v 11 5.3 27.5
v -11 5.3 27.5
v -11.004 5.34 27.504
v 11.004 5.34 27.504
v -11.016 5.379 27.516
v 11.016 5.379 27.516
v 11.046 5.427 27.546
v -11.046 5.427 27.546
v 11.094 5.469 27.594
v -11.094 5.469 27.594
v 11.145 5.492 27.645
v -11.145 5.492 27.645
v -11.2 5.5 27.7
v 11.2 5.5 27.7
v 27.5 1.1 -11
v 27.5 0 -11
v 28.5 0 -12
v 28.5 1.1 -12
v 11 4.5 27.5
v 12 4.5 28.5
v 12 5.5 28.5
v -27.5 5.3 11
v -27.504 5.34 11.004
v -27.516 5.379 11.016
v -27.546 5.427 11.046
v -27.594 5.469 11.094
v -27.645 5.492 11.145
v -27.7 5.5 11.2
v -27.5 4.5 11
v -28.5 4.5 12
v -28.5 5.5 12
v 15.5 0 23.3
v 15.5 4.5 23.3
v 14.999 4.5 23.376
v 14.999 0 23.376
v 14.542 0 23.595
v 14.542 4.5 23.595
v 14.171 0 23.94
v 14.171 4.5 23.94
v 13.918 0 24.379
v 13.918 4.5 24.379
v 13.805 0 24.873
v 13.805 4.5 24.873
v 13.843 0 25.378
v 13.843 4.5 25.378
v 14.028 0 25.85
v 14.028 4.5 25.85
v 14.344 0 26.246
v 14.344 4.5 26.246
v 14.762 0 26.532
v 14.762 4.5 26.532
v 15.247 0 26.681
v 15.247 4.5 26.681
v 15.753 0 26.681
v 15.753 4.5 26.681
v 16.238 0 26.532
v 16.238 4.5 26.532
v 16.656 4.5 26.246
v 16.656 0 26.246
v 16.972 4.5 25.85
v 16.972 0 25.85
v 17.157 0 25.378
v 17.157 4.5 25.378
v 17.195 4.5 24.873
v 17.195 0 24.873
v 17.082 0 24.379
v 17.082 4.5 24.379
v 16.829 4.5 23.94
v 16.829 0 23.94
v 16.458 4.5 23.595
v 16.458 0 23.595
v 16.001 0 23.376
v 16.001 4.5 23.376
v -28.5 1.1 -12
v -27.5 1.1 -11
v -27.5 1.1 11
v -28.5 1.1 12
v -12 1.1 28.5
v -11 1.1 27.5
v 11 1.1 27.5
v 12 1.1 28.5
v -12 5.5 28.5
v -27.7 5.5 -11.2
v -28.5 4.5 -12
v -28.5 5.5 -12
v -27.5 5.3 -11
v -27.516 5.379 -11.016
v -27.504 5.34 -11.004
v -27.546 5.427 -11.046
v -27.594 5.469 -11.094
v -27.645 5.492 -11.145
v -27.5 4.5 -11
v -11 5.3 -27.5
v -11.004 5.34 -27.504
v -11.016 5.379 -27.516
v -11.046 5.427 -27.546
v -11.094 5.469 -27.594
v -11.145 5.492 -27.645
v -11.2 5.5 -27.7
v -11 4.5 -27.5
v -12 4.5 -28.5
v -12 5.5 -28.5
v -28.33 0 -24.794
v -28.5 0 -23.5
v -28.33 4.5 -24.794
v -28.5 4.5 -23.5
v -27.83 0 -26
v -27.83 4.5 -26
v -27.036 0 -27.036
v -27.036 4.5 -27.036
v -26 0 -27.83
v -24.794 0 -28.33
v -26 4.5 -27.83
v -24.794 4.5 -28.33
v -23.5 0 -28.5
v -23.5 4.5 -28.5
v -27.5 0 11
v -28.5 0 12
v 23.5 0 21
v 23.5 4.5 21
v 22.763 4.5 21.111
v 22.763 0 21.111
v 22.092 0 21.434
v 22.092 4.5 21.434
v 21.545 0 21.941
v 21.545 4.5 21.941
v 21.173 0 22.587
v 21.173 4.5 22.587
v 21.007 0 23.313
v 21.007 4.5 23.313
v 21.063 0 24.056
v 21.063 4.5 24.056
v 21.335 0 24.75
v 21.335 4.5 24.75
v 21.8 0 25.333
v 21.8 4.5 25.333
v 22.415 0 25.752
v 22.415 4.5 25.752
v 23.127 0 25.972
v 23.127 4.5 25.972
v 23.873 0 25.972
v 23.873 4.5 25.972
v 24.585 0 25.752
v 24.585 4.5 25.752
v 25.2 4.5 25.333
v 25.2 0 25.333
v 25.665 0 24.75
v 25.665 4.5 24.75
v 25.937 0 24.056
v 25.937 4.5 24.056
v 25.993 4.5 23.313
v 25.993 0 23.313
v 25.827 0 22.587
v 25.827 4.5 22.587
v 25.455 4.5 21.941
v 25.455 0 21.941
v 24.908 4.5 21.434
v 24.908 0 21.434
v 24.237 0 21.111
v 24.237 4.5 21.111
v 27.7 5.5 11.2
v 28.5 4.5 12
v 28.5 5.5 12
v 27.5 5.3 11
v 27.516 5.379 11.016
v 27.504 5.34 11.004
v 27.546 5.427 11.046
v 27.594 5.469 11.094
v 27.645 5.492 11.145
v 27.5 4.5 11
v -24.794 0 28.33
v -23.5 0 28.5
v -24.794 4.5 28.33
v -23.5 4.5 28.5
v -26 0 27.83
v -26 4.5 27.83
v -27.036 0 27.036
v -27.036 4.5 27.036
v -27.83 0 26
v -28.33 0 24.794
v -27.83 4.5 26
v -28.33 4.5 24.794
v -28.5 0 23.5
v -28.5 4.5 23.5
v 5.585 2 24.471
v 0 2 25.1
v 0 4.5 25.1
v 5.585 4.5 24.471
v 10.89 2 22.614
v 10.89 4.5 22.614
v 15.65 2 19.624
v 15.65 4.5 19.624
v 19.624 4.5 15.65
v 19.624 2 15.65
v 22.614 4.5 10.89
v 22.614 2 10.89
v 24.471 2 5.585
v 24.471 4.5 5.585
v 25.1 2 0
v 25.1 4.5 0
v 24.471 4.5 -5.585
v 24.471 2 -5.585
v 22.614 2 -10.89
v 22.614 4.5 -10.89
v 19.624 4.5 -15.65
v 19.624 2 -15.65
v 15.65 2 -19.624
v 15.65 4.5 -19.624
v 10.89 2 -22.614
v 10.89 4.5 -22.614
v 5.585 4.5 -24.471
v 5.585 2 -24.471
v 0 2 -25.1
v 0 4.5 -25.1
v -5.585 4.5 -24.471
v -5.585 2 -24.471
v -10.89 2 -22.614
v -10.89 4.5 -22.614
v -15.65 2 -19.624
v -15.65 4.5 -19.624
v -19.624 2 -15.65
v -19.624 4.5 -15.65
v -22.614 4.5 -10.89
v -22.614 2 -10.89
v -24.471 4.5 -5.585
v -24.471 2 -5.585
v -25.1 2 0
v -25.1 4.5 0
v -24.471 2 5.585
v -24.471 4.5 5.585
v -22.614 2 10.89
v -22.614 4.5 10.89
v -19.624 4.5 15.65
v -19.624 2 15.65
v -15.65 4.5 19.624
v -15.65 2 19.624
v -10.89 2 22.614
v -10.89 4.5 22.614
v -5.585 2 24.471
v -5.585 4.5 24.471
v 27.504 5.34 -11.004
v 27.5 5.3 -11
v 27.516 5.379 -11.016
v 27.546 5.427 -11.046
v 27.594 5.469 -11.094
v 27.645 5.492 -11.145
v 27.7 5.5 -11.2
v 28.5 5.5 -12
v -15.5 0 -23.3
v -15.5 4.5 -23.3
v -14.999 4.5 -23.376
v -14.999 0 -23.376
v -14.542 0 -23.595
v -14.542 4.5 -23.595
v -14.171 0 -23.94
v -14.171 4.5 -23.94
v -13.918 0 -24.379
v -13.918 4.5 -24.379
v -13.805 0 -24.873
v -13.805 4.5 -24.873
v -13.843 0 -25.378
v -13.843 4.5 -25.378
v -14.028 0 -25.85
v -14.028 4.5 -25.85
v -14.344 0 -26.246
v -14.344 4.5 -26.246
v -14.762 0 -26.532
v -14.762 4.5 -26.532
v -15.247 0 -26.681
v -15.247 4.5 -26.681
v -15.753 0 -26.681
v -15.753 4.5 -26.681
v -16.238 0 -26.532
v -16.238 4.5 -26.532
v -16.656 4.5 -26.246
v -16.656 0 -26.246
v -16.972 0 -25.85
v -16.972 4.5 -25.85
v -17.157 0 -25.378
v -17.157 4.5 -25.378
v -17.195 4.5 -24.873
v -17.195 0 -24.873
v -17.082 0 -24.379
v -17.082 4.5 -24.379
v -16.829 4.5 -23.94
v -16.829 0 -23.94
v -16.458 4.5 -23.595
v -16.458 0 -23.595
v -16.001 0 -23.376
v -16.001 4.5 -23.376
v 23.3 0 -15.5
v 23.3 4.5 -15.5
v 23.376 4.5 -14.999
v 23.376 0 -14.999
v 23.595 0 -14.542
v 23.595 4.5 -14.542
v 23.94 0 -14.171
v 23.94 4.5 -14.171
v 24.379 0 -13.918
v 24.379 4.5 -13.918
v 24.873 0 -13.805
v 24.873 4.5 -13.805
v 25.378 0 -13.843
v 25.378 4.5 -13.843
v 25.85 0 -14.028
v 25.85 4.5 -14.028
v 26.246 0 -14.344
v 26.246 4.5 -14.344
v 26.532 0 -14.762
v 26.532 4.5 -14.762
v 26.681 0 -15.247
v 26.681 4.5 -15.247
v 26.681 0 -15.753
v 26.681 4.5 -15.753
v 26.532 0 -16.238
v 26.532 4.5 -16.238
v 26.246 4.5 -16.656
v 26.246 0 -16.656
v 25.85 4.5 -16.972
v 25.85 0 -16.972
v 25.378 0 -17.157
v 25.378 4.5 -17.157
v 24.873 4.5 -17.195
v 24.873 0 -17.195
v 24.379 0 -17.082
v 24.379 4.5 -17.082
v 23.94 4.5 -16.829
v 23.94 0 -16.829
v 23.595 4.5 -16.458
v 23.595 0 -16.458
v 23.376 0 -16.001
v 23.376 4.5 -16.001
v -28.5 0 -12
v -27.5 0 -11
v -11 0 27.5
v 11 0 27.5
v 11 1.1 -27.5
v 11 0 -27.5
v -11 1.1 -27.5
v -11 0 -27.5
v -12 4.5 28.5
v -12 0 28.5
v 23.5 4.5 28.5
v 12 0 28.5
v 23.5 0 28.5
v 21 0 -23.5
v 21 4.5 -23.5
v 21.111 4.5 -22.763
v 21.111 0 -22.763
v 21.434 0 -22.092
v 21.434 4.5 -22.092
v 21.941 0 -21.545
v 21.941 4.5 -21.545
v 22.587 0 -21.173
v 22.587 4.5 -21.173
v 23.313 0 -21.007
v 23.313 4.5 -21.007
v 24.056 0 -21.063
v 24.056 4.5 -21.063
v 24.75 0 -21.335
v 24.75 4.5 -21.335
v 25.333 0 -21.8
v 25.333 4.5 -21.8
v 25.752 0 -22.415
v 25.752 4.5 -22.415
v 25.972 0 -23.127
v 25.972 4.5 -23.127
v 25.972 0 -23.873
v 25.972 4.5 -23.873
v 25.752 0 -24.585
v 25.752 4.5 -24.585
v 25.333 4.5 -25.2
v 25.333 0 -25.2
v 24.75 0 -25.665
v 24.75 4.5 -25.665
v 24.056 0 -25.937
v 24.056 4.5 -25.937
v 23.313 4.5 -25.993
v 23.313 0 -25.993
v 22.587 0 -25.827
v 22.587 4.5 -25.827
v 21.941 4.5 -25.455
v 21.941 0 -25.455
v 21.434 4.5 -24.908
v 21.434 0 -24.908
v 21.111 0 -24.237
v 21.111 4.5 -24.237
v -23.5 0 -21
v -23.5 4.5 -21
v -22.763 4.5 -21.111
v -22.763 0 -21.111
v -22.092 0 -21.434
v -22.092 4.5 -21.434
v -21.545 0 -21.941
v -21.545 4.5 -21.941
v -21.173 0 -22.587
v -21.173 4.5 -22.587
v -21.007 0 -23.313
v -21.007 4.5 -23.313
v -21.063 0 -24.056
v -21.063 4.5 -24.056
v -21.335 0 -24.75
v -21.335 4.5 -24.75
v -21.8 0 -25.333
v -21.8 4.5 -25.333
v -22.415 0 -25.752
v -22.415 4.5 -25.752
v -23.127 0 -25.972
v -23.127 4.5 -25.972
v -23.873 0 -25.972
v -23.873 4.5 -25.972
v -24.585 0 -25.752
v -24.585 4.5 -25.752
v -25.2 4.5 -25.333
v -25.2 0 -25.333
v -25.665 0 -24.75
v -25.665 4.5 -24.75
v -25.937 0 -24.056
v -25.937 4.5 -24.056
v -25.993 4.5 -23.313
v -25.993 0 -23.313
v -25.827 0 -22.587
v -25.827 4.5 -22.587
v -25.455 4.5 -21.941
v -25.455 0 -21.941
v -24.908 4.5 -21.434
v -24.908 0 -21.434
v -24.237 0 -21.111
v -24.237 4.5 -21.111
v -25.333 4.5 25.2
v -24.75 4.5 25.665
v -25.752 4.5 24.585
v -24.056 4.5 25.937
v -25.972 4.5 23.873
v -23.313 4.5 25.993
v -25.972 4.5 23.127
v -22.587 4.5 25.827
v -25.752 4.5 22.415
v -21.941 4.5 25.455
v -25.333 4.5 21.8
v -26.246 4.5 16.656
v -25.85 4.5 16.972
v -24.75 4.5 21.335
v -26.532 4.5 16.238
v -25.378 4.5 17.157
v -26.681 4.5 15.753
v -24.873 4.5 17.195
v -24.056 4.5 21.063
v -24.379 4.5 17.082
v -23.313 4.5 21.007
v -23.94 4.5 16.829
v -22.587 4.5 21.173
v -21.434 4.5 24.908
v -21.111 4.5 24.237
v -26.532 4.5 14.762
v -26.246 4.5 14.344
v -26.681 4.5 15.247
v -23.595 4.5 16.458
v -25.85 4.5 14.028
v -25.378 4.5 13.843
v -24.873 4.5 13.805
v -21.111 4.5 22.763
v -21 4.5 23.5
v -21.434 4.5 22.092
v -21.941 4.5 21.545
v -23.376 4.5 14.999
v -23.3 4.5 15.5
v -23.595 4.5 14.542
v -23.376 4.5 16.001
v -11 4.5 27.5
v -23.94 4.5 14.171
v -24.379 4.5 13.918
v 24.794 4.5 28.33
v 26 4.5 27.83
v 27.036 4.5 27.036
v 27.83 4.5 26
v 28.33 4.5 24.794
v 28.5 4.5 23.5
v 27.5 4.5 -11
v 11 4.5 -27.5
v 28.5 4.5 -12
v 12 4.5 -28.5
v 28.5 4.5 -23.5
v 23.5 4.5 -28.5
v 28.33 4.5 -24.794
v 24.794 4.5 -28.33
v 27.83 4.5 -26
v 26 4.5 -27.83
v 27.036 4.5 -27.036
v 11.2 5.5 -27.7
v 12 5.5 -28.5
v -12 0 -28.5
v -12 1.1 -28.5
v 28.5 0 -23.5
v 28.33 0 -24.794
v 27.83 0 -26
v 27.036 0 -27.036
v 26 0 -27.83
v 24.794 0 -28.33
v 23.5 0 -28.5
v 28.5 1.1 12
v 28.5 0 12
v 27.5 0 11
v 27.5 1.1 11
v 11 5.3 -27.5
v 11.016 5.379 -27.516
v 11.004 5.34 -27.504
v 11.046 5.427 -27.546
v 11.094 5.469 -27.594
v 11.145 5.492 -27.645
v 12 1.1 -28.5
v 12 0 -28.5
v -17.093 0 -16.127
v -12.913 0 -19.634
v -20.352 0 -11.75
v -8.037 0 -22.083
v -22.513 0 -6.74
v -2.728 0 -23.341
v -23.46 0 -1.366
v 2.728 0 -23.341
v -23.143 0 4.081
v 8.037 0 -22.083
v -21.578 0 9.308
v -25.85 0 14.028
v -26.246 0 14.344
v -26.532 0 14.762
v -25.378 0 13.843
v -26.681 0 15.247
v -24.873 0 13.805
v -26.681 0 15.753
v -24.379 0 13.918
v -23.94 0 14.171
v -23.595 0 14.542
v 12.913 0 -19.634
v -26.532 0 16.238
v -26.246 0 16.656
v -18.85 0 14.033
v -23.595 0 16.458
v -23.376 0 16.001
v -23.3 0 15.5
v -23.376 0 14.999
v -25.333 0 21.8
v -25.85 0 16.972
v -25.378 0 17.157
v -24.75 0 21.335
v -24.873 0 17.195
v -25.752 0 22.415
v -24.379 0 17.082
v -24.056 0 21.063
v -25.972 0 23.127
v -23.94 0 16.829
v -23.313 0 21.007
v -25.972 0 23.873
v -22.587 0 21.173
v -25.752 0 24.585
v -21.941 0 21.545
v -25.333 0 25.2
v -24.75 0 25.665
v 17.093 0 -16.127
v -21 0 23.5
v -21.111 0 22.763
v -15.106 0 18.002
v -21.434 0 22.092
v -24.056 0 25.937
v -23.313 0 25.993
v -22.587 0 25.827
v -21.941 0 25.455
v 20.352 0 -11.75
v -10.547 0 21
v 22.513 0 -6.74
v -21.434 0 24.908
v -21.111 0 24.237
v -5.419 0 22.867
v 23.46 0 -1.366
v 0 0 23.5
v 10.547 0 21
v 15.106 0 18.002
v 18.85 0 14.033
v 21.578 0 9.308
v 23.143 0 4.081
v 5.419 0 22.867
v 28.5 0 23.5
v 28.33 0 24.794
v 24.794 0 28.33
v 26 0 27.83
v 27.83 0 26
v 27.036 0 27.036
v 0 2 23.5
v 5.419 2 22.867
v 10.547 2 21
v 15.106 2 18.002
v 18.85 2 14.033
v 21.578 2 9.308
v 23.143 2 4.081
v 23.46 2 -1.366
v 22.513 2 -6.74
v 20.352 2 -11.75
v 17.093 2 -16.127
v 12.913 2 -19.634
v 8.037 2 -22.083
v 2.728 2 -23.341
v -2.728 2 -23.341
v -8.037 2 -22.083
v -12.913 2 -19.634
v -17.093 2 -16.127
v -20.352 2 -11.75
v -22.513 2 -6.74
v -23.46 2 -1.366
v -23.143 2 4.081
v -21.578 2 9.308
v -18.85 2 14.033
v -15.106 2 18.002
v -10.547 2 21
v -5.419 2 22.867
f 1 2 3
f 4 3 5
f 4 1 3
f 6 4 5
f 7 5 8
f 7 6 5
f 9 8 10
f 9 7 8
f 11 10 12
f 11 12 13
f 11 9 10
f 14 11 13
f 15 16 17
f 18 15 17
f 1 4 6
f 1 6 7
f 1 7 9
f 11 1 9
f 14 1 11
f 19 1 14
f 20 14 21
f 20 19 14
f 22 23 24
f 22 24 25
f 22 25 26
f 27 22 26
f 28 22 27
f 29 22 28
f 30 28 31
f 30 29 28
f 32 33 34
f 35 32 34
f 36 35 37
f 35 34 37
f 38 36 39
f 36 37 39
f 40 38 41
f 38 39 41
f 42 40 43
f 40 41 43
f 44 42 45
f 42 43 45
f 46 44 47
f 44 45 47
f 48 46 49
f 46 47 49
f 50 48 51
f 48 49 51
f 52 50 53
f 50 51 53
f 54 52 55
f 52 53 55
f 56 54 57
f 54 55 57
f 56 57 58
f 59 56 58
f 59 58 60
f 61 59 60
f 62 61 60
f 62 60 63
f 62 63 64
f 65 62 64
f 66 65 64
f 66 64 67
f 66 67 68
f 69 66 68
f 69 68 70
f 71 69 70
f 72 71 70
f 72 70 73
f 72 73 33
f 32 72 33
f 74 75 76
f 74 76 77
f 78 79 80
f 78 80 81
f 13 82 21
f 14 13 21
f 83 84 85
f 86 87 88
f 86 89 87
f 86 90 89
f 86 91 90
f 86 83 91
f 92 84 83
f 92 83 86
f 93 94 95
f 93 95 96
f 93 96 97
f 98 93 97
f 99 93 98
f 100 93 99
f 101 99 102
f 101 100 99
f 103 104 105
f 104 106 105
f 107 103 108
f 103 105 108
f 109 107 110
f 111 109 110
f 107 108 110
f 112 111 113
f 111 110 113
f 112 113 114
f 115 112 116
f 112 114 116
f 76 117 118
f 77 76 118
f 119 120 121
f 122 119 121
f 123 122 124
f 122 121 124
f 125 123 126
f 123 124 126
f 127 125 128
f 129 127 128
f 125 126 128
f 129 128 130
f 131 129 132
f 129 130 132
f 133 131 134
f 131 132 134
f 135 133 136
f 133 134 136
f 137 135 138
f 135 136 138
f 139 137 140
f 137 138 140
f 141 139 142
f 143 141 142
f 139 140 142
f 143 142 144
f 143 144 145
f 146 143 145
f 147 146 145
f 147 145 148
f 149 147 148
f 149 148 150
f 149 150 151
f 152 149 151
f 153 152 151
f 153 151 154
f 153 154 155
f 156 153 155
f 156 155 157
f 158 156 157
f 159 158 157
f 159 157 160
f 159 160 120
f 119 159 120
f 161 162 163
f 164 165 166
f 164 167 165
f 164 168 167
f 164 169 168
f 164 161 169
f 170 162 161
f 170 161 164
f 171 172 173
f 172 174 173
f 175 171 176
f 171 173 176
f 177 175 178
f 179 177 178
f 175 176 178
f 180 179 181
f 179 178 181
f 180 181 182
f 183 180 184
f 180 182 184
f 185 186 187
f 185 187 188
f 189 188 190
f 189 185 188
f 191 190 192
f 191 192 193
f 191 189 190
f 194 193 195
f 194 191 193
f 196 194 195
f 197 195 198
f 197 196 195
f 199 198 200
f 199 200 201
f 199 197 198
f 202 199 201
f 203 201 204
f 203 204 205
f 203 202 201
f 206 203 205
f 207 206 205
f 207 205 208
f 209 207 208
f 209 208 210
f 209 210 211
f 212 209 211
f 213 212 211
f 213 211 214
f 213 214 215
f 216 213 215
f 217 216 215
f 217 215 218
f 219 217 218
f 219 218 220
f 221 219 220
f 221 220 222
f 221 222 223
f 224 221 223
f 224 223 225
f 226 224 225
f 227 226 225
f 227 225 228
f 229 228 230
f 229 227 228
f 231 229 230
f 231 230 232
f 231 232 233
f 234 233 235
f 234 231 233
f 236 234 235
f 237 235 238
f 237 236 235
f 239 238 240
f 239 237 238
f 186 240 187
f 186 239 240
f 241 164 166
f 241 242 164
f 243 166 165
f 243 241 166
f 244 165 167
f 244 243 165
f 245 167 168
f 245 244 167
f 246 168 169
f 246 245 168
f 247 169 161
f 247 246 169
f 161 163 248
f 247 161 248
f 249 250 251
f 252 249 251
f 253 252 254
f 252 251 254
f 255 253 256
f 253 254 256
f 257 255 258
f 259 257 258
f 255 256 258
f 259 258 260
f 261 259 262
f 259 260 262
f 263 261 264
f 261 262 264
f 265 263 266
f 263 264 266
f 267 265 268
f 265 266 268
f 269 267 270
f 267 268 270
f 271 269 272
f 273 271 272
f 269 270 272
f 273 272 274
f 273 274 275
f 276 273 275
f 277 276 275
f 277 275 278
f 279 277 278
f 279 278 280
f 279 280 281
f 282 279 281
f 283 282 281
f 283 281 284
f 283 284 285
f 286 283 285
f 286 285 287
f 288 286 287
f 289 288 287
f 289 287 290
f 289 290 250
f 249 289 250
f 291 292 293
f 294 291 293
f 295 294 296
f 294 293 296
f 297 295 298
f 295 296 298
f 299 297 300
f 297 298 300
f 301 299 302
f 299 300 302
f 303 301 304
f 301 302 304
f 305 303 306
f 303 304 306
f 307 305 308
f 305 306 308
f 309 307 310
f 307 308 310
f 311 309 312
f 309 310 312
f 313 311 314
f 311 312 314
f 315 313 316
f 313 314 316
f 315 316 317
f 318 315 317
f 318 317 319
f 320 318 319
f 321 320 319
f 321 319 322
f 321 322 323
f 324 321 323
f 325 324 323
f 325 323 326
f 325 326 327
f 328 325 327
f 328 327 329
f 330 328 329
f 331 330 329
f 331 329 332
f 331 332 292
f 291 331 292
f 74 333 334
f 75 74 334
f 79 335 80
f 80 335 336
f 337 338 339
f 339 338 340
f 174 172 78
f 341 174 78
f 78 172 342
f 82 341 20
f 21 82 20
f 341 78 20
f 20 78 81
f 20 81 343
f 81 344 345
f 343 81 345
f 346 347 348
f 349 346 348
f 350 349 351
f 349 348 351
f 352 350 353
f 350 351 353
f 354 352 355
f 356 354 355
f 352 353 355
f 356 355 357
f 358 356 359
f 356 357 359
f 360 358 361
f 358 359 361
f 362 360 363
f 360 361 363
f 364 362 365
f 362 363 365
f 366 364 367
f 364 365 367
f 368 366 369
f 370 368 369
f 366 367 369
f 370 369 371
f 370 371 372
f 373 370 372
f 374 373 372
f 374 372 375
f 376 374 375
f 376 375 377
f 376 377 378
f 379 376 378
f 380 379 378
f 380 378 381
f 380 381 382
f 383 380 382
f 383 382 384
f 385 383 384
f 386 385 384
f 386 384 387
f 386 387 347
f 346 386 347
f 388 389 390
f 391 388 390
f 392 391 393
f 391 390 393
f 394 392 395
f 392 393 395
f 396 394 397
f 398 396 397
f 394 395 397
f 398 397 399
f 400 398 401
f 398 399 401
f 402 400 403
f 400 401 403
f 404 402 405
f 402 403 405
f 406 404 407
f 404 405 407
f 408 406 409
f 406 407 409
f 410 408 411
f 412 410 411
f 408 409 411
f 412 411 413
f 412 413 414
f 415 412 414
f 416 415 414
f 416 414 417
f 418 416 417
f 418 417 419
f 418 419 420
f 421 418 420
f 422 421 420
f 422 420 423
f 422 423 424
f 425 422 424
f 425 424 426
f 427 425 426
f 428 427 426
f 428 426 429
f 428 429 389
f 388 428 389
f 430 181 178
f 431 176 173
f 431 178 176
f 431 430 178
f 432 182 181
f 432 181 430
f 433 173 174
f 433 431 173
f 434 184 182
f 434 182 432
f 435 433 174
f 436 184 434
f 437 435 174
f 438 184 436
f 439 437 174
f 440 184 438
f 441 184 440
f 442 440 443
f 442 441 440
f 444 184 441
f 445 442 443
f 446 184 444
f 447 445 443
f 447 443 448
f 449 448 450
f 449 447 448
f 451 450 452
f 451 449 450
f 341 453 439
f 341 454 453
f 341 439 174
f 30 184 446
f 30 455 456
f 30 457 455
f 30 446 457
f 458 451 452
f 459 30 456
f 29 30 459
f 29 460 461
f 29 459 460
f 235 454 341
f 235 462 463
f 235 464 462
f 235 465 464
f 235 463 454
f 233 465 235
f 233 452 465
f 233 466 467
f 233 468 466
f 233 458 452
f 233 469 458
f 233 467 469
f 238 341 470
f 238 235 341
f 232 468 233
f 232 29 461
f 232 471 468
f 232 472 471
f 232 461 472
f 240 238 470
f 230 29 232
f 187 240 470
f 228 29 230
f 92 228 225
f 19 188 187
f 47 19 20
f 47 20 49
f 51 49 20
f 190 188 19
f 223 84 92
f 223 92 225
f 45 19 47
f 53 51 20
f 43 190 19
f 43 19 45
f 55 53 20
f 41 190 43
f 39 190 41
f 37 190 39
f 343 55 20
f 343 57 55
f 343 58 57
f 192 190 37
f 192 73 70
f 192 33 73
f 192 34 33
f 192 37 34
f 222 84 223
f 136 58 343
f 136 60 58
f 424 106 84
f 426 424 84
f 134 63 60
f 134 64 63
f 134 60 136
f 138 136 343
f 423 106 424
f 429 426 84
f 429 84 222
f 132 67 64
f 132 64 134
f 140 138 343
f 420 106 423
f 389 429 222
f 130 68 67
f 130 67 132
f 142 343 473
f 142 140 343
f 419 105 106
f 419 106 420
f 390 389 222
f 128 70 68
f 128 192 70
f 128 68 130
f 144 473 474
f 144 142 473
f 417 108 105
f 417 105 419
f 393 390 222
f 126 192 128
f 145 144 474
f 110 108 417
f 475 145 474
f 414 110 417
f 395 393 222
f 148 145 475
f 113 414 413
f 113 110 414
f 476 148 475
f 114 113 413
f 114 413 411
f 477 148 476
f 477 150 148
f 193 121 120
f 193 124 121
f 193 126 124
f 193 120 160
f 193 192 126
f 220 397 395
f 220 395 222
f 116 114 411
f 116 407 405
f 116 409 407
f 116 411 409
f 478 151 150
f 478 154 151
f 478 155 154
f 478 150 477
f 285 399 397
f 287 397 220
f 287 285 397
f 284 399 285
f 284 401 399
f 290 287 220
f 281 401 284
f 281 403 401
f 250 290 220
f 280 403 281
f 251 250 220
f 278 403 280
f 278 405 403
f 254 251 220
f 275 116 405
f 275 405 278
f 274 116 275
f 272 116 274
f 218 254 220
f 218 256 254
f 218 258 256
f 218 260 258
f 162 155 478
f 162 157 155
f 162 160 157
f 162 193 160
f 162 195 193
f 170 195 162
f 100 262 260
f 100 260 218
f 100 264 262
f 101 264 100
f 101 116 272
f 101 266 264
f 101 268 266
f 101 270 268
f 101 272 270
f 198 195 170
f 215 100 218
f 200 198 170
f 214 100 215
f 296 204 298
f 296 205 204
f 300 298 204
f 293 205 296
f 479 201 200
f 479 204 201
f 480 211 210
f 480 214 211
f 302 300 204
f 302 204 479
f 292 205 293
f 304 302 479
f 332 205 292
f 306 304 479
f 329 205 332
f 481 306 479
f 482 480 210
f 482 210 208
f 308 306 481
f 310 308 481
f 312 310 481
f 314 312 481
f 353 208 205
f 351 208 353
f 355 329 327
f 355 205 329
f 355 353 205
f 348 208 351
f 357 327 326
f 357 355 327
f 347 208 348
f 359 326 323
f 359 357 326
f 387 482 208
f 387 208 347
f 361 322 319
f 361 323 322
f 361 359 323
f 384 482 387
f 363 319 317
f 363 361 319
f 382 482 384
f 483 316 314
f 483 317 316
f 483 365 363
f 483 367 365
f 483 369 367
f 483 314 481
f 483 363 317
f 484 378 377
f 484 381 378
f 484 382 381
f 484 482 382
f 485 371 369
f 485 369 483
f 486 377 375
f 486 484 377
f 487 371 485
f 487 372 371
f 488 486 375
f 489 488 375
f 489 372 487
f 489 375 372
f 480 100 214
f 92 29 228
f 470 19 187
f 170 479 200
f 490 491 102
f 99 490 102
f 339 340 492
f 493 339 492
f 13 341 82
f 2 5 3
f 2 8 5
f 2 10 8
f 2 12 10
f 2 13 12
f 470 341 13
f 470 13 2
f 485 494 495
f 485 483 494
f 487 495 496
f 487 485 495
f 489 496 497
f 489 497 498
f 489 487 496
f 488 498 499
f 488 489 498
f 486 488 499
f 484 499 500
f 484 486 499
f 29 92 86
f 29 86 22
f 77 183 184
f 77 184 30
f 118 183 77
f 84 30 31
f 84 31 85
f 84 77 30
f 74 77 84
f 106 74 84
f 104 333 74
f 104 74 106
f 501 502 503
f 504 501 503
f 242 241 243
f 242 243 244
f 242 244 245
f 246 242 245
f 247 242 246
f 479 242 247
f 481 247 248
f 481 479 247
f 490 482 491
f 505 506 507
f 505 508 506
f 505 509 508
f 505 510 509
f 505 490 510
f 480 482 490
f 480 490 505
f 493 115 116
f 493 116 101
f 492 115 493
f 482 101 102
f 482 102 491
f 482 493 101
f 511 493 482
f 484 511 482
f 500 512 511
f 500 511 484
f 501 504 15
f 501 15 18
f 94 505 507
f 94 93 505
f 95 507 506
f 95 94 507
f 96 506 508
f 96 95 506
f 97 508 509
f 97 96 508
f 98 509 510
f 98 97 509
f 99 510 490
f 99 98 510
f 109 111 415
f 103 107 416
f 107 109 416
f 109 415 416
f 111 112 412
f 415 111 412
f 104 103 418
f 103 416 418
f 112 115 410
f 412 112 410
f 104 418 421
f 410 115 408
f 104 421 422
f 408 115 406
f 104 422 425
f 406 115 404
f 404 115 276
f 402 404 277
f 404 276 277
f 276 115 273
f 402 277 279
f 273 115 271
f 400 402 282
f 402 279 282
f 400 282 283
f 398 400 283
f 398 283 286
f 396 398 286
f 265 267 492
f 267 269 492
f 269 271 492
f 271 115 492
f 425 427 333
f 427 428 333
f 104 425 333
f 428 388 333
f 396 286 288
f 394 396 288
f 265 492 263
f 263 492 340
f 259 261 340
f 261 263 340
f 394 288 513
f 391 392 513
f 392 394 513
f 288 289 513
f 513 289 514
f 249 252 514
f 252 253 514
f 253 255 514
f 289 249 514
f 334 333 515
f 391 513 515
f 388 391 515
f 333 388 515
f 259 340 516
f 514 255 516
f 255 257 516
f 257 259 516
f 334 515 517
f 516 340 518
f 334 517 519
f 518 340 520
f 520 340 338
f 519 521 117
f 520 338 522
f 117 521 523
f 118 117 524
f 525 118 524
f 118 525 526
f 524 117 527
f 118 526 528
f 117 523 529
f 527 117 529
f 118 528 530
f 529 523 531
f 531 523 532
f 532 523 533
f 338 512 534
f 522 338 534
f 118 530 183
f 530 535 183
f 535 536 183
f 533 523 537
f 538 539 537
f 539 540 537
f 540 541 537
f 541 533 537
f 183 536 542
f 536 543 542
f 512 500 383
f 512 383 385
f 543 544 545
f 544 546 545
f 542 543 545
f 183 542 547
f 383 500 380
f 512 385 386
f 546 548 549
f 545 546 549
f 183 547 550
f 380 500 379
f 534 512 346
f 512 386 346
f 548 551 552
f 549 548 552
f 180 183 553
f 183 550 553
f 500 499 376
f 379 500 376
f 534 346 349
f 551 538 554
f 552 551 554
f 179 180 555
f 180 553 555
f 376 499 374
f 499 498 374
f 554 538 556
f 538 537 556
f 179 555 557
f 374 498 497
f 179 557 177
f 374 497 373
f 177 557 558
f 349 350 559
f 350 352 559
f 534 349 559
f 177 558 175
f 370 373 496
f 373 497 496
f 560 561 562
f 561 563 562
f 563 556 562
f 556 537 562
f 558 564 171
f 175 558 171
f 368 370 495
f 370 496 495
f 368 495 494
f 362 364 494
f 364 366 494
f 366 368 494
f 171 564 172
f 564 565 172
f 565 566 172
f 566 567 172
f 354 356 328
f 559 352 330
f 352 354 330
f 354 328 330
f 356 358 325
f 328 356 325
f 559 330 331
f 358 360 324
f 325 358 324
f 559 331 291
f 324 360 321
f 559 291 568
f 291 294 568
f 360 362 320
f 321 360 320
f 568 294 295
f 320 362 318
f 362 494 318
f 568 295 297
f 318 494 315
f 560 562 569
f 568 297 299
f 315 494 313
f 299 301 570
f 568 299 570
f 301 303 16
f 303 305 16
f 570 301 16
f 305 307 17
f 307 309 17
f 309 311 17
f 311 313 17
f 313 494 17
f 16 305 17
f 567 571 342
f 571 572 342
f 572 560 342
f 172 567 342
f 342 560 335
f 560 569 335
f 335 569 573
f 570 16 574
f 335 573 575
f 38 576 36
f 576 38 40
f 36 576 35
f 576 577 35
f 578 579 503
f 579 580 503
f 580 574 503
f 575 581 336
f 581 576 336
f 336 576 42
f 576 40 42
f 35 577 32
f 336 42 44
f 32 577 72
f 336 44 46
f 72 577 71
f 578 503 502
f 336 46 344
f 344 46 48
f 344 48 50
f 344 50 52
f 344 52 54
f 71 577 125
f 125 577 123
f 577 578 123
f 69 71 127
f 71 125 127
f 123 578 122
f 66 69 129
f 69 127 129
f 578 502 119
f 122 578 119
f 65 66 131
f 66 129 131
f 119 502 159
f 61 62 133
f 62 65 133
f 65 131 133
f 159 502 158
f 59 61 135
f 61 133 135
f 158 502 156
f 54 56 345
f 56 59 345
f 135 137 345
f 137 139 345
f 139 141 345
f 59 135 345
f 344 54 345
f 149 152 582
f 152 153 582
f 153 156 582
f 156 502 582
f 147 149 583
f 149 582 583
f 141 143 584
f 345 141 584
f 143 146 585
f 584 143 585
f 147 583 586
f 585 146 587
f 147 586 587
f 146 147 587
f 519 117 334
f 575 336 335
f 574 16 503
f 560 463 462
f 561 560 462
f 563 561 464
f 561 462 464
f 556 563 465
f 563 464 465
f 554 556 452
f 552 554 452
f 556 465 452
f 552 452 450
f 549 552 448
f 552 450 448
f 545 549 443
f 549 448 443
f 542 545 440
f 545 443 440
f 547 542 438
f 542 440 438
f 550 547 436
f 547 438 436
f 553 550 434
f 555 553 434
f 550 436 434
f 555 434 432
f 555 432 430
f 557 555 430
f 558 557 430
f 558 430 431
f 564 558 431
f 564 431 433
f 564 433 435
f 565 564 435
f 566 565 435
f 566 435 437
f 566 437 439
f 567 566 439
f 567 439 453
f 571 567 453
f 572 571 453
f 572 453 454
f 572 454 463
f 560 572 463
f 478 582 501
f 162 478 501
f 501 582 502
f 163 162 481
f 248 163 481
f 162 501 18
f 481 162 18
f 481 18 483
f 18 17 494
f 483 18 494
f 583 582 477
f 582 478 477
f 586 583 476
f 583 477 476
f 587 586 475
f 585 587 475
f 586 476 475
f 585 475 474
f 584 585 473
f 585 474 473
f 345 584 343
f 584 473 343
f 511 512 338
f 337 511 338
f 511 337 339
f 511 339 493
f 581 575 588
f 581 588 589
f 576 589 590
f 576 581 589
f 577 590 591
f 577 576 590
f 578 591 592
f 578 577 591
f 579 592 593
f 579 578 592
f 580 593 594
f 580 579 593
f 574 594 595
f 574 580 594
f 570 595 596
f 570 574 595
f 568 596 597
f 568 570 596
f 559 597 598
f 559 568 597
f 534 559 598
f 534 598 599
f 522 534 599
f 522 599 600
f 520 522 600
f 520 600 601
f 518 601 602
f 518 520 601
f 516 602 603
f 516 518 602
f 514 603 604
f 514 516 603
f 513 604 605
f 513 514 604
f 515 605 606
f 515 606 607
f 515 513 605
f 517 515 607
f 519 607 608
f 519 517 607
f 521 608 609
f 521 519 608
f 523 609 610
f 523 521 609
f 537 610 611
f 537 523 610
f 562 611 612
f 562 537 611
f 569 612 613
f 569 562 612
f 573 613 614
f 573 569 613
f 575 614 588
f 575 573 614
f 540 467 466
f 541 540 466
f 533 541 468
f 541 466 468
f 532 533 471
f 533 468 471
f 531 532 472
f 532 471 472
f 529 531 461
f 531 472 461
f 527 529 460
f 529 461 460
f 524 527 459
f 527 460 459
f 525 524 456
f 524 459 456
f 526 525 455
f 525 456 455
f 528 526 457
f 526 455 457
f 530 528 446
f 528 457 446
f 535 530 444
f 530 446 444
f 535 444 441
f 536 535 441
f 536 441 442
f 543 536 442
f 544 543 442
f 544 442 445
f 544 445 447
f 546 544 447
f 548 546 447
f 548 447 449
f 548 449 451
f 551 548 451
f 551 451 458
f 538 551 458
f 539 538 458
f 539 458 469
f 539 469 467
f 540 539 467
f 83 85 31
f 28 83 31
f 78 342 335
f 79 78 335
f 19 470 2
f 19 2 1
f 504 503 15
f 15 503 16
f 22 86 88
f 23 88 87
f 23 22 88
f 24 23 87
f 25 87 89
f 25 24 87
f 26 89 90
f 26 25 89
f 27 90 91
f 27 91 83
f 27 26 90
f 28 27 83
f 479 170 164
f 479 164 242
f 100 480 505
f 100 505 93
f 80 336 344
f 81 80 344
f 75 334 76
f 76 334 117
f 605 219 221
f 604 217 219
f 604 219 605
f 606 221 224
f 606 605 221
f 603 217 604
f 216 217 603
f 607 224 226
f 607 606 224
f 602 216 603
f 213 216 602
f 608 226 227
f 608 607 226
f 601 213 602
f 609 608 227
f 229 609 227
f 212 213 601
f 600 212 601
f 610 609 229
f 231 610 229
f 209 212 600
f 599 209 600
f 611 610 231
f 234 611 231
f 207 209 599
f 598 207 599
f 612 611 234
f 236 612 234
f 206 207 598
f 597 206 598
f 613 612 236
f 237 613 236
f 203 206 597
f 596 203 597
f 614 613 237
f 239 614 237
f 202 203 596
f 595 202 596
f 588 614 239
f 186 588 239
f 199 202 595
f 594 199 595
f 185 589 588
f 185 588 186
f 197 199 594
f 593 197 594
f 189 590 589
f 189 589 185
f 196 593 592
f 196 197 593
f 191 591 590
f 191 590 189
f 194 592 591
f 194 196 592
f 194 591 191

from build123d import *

# Parameters (mm, degrees)
SKETCH2_W                = 57
SKETCH2_H                = 57
SKETCH2_R                = 25.1
BOSS_EXTRUDE1_DEPTH      = 4.5
SKETCH2_3_R              = 25.1
SKETCH2_3_R_2            = 23.5
BOSS_EXTRUDE2_DEPTH      = 2
FILLET1_R                = 5
SKETCH4_R                = 2.5
SKETCH4_R_2              = 1.7
CUT_EXTRUDE1_DEPTH       = 41.555517504
BOSS_EXTRUDE3_DEPTH      = 1
FILLET2_R                = 0.2
CUT_EXTRUDE2_DEPTH       = 1.1
CIRPATTERN7_COUNT        = 4
FILLET2_OF_CIRPATTERN7_R = 0.2
FILLET3_R                = 5


with BuildPart() as part:
    # Sketch2 → Boss-Extrude1 (new body)
    with BuildSketch(Plane(origin=(0, 0, 0), x_dir=(1, 0, 0), z_dir=(0, 1, 0))):
        Rectangle(SKETCH2_W, SKETCH2_H)
        Circle(SKETCH2_R, mode=Mode.SUBTRACT)
    extrude(amount=BOSS_EXTRUDE1_DEPTH)

    # Sketch2<3> → Boss-Extrude2 (add)
    with BuildSketch(Plane(origin=(0, 0, 0), x_dir=(1, 0, 0), z_dir=(0, 1, 0))):
        Circle(SKETCH2_3_R)
        Circle(SKETCH2_3_R_2, mode=Mode.SUBTRACT)
    extrude(amount=BOSS_EXTRUDE2_DEPTH)

    # Fillet1
    fillet1_edges = [part.edges().sort_by_distance(p)[0] for p in [
        (-28.5, 2.25, -28.5),
    ]]
    fillet(fillet1_edges, radius=FILLET1_R)

    # Sketch4 → Cut-Extrude1 (cut, through all)
    with BuildSketch(Plane(origin=(0, 4.5, 0), x_dir=(1, 0, 0), z_dir=(0, 1, 0))):
        with Locations((-23.5, 23.5)):
            Circle(SKETCH4_R)
        with Locations((-15.5, 25)):
            Circle(SKETCH4_R_2)
    cut_extrude1 = extrude(amount=-CUT_EXTRUDE1_DEPTH, mode=Mode.SUBTRACT)

    # Sketch5 → Boss-Extrude3 (add)
    with BuildSketch(Plane(origin=(0, 4.5, 0), x_dir=(1, 0, 0), z_dir=(0, 1, 0))):
        Polygon((11, 27.5), (-11, 27.5), (-12, 28.5), (12, 28.5), align=None)
    boss_extrude3 = extrude(amount=BOSS_EXTRUDE3_DEPTH)

    # Fillet2
    fillet2_edges = [part.edges().sort_by_distance(p)[0] for p in [
        (0, 5.5, -27.5),
    ]]
    fillet(fillet2_edges, radius=FILLET2_R)

    # Sketch6 → Cut-Extrude2 (cut)
    with BuildSketch(Plane.XZ):
        Polygon((11, -27.5), (-11, -27.5), (-12, -28.5), (12, -28.5), align=None)
    cut_extrude2 = extrude(amount=-CUT_EXTRUDE2_DEPTH, mode=Mode.SUBTRACT)

    # CirPattern7: Cut-Extrude1, Boss-Extrude3, Cut-Extrude2 ×4 about axis
    cirpattern7_axis = Axis((0, 2, 0), (0, 1, 0))
    add([cut_extrude1.rotate(cirpattern7_axis, i * 360 / CIRPATTERN7_COUNT) for i in range(1, CIRPATTERN7_COUNT)], mode=Mode.SUBTRACT)
    add([boss_extrude3.rotate(cirpattern7_axis, i * 360 / CIRPATTERN7_COUNT) for i in range(1, CIRPATTERN7_COUNT)])
    add([cut_extrude2.rotate(cirpattern7_axis, i * 360 / CIRPATTERN7_COUNT) for i in range(1, CIRPATTERN7_COUNT)], mode=Mode.SUBTRACT)

    # Fillet2 of CirPattern7
    fillet2_of_cirpattern7_edges = [part.edges().sort_by_distance(p)[0] for p in [
        (-27.5, 5.5, 0),
        (0, 5.5, 27.5),
        (27.5, 5.5, 0),
    ]]
    fillet(fillet2_of_cirpattern7_edges, radius=FILLET2_OF_CIRPATTERN7_R)

    # Fillet3
    fillet3_edges = [part.edges().sort_by_distance(p)[0] for p in [
        (28.5, 2.25, -28.5),
        (28.5, 2.25, 28.5),
        (-28.5, 2.25, 28.5),
    ]]
    fillet(fillet3_edges, radius=FILLET3_R)


solid = part.part
